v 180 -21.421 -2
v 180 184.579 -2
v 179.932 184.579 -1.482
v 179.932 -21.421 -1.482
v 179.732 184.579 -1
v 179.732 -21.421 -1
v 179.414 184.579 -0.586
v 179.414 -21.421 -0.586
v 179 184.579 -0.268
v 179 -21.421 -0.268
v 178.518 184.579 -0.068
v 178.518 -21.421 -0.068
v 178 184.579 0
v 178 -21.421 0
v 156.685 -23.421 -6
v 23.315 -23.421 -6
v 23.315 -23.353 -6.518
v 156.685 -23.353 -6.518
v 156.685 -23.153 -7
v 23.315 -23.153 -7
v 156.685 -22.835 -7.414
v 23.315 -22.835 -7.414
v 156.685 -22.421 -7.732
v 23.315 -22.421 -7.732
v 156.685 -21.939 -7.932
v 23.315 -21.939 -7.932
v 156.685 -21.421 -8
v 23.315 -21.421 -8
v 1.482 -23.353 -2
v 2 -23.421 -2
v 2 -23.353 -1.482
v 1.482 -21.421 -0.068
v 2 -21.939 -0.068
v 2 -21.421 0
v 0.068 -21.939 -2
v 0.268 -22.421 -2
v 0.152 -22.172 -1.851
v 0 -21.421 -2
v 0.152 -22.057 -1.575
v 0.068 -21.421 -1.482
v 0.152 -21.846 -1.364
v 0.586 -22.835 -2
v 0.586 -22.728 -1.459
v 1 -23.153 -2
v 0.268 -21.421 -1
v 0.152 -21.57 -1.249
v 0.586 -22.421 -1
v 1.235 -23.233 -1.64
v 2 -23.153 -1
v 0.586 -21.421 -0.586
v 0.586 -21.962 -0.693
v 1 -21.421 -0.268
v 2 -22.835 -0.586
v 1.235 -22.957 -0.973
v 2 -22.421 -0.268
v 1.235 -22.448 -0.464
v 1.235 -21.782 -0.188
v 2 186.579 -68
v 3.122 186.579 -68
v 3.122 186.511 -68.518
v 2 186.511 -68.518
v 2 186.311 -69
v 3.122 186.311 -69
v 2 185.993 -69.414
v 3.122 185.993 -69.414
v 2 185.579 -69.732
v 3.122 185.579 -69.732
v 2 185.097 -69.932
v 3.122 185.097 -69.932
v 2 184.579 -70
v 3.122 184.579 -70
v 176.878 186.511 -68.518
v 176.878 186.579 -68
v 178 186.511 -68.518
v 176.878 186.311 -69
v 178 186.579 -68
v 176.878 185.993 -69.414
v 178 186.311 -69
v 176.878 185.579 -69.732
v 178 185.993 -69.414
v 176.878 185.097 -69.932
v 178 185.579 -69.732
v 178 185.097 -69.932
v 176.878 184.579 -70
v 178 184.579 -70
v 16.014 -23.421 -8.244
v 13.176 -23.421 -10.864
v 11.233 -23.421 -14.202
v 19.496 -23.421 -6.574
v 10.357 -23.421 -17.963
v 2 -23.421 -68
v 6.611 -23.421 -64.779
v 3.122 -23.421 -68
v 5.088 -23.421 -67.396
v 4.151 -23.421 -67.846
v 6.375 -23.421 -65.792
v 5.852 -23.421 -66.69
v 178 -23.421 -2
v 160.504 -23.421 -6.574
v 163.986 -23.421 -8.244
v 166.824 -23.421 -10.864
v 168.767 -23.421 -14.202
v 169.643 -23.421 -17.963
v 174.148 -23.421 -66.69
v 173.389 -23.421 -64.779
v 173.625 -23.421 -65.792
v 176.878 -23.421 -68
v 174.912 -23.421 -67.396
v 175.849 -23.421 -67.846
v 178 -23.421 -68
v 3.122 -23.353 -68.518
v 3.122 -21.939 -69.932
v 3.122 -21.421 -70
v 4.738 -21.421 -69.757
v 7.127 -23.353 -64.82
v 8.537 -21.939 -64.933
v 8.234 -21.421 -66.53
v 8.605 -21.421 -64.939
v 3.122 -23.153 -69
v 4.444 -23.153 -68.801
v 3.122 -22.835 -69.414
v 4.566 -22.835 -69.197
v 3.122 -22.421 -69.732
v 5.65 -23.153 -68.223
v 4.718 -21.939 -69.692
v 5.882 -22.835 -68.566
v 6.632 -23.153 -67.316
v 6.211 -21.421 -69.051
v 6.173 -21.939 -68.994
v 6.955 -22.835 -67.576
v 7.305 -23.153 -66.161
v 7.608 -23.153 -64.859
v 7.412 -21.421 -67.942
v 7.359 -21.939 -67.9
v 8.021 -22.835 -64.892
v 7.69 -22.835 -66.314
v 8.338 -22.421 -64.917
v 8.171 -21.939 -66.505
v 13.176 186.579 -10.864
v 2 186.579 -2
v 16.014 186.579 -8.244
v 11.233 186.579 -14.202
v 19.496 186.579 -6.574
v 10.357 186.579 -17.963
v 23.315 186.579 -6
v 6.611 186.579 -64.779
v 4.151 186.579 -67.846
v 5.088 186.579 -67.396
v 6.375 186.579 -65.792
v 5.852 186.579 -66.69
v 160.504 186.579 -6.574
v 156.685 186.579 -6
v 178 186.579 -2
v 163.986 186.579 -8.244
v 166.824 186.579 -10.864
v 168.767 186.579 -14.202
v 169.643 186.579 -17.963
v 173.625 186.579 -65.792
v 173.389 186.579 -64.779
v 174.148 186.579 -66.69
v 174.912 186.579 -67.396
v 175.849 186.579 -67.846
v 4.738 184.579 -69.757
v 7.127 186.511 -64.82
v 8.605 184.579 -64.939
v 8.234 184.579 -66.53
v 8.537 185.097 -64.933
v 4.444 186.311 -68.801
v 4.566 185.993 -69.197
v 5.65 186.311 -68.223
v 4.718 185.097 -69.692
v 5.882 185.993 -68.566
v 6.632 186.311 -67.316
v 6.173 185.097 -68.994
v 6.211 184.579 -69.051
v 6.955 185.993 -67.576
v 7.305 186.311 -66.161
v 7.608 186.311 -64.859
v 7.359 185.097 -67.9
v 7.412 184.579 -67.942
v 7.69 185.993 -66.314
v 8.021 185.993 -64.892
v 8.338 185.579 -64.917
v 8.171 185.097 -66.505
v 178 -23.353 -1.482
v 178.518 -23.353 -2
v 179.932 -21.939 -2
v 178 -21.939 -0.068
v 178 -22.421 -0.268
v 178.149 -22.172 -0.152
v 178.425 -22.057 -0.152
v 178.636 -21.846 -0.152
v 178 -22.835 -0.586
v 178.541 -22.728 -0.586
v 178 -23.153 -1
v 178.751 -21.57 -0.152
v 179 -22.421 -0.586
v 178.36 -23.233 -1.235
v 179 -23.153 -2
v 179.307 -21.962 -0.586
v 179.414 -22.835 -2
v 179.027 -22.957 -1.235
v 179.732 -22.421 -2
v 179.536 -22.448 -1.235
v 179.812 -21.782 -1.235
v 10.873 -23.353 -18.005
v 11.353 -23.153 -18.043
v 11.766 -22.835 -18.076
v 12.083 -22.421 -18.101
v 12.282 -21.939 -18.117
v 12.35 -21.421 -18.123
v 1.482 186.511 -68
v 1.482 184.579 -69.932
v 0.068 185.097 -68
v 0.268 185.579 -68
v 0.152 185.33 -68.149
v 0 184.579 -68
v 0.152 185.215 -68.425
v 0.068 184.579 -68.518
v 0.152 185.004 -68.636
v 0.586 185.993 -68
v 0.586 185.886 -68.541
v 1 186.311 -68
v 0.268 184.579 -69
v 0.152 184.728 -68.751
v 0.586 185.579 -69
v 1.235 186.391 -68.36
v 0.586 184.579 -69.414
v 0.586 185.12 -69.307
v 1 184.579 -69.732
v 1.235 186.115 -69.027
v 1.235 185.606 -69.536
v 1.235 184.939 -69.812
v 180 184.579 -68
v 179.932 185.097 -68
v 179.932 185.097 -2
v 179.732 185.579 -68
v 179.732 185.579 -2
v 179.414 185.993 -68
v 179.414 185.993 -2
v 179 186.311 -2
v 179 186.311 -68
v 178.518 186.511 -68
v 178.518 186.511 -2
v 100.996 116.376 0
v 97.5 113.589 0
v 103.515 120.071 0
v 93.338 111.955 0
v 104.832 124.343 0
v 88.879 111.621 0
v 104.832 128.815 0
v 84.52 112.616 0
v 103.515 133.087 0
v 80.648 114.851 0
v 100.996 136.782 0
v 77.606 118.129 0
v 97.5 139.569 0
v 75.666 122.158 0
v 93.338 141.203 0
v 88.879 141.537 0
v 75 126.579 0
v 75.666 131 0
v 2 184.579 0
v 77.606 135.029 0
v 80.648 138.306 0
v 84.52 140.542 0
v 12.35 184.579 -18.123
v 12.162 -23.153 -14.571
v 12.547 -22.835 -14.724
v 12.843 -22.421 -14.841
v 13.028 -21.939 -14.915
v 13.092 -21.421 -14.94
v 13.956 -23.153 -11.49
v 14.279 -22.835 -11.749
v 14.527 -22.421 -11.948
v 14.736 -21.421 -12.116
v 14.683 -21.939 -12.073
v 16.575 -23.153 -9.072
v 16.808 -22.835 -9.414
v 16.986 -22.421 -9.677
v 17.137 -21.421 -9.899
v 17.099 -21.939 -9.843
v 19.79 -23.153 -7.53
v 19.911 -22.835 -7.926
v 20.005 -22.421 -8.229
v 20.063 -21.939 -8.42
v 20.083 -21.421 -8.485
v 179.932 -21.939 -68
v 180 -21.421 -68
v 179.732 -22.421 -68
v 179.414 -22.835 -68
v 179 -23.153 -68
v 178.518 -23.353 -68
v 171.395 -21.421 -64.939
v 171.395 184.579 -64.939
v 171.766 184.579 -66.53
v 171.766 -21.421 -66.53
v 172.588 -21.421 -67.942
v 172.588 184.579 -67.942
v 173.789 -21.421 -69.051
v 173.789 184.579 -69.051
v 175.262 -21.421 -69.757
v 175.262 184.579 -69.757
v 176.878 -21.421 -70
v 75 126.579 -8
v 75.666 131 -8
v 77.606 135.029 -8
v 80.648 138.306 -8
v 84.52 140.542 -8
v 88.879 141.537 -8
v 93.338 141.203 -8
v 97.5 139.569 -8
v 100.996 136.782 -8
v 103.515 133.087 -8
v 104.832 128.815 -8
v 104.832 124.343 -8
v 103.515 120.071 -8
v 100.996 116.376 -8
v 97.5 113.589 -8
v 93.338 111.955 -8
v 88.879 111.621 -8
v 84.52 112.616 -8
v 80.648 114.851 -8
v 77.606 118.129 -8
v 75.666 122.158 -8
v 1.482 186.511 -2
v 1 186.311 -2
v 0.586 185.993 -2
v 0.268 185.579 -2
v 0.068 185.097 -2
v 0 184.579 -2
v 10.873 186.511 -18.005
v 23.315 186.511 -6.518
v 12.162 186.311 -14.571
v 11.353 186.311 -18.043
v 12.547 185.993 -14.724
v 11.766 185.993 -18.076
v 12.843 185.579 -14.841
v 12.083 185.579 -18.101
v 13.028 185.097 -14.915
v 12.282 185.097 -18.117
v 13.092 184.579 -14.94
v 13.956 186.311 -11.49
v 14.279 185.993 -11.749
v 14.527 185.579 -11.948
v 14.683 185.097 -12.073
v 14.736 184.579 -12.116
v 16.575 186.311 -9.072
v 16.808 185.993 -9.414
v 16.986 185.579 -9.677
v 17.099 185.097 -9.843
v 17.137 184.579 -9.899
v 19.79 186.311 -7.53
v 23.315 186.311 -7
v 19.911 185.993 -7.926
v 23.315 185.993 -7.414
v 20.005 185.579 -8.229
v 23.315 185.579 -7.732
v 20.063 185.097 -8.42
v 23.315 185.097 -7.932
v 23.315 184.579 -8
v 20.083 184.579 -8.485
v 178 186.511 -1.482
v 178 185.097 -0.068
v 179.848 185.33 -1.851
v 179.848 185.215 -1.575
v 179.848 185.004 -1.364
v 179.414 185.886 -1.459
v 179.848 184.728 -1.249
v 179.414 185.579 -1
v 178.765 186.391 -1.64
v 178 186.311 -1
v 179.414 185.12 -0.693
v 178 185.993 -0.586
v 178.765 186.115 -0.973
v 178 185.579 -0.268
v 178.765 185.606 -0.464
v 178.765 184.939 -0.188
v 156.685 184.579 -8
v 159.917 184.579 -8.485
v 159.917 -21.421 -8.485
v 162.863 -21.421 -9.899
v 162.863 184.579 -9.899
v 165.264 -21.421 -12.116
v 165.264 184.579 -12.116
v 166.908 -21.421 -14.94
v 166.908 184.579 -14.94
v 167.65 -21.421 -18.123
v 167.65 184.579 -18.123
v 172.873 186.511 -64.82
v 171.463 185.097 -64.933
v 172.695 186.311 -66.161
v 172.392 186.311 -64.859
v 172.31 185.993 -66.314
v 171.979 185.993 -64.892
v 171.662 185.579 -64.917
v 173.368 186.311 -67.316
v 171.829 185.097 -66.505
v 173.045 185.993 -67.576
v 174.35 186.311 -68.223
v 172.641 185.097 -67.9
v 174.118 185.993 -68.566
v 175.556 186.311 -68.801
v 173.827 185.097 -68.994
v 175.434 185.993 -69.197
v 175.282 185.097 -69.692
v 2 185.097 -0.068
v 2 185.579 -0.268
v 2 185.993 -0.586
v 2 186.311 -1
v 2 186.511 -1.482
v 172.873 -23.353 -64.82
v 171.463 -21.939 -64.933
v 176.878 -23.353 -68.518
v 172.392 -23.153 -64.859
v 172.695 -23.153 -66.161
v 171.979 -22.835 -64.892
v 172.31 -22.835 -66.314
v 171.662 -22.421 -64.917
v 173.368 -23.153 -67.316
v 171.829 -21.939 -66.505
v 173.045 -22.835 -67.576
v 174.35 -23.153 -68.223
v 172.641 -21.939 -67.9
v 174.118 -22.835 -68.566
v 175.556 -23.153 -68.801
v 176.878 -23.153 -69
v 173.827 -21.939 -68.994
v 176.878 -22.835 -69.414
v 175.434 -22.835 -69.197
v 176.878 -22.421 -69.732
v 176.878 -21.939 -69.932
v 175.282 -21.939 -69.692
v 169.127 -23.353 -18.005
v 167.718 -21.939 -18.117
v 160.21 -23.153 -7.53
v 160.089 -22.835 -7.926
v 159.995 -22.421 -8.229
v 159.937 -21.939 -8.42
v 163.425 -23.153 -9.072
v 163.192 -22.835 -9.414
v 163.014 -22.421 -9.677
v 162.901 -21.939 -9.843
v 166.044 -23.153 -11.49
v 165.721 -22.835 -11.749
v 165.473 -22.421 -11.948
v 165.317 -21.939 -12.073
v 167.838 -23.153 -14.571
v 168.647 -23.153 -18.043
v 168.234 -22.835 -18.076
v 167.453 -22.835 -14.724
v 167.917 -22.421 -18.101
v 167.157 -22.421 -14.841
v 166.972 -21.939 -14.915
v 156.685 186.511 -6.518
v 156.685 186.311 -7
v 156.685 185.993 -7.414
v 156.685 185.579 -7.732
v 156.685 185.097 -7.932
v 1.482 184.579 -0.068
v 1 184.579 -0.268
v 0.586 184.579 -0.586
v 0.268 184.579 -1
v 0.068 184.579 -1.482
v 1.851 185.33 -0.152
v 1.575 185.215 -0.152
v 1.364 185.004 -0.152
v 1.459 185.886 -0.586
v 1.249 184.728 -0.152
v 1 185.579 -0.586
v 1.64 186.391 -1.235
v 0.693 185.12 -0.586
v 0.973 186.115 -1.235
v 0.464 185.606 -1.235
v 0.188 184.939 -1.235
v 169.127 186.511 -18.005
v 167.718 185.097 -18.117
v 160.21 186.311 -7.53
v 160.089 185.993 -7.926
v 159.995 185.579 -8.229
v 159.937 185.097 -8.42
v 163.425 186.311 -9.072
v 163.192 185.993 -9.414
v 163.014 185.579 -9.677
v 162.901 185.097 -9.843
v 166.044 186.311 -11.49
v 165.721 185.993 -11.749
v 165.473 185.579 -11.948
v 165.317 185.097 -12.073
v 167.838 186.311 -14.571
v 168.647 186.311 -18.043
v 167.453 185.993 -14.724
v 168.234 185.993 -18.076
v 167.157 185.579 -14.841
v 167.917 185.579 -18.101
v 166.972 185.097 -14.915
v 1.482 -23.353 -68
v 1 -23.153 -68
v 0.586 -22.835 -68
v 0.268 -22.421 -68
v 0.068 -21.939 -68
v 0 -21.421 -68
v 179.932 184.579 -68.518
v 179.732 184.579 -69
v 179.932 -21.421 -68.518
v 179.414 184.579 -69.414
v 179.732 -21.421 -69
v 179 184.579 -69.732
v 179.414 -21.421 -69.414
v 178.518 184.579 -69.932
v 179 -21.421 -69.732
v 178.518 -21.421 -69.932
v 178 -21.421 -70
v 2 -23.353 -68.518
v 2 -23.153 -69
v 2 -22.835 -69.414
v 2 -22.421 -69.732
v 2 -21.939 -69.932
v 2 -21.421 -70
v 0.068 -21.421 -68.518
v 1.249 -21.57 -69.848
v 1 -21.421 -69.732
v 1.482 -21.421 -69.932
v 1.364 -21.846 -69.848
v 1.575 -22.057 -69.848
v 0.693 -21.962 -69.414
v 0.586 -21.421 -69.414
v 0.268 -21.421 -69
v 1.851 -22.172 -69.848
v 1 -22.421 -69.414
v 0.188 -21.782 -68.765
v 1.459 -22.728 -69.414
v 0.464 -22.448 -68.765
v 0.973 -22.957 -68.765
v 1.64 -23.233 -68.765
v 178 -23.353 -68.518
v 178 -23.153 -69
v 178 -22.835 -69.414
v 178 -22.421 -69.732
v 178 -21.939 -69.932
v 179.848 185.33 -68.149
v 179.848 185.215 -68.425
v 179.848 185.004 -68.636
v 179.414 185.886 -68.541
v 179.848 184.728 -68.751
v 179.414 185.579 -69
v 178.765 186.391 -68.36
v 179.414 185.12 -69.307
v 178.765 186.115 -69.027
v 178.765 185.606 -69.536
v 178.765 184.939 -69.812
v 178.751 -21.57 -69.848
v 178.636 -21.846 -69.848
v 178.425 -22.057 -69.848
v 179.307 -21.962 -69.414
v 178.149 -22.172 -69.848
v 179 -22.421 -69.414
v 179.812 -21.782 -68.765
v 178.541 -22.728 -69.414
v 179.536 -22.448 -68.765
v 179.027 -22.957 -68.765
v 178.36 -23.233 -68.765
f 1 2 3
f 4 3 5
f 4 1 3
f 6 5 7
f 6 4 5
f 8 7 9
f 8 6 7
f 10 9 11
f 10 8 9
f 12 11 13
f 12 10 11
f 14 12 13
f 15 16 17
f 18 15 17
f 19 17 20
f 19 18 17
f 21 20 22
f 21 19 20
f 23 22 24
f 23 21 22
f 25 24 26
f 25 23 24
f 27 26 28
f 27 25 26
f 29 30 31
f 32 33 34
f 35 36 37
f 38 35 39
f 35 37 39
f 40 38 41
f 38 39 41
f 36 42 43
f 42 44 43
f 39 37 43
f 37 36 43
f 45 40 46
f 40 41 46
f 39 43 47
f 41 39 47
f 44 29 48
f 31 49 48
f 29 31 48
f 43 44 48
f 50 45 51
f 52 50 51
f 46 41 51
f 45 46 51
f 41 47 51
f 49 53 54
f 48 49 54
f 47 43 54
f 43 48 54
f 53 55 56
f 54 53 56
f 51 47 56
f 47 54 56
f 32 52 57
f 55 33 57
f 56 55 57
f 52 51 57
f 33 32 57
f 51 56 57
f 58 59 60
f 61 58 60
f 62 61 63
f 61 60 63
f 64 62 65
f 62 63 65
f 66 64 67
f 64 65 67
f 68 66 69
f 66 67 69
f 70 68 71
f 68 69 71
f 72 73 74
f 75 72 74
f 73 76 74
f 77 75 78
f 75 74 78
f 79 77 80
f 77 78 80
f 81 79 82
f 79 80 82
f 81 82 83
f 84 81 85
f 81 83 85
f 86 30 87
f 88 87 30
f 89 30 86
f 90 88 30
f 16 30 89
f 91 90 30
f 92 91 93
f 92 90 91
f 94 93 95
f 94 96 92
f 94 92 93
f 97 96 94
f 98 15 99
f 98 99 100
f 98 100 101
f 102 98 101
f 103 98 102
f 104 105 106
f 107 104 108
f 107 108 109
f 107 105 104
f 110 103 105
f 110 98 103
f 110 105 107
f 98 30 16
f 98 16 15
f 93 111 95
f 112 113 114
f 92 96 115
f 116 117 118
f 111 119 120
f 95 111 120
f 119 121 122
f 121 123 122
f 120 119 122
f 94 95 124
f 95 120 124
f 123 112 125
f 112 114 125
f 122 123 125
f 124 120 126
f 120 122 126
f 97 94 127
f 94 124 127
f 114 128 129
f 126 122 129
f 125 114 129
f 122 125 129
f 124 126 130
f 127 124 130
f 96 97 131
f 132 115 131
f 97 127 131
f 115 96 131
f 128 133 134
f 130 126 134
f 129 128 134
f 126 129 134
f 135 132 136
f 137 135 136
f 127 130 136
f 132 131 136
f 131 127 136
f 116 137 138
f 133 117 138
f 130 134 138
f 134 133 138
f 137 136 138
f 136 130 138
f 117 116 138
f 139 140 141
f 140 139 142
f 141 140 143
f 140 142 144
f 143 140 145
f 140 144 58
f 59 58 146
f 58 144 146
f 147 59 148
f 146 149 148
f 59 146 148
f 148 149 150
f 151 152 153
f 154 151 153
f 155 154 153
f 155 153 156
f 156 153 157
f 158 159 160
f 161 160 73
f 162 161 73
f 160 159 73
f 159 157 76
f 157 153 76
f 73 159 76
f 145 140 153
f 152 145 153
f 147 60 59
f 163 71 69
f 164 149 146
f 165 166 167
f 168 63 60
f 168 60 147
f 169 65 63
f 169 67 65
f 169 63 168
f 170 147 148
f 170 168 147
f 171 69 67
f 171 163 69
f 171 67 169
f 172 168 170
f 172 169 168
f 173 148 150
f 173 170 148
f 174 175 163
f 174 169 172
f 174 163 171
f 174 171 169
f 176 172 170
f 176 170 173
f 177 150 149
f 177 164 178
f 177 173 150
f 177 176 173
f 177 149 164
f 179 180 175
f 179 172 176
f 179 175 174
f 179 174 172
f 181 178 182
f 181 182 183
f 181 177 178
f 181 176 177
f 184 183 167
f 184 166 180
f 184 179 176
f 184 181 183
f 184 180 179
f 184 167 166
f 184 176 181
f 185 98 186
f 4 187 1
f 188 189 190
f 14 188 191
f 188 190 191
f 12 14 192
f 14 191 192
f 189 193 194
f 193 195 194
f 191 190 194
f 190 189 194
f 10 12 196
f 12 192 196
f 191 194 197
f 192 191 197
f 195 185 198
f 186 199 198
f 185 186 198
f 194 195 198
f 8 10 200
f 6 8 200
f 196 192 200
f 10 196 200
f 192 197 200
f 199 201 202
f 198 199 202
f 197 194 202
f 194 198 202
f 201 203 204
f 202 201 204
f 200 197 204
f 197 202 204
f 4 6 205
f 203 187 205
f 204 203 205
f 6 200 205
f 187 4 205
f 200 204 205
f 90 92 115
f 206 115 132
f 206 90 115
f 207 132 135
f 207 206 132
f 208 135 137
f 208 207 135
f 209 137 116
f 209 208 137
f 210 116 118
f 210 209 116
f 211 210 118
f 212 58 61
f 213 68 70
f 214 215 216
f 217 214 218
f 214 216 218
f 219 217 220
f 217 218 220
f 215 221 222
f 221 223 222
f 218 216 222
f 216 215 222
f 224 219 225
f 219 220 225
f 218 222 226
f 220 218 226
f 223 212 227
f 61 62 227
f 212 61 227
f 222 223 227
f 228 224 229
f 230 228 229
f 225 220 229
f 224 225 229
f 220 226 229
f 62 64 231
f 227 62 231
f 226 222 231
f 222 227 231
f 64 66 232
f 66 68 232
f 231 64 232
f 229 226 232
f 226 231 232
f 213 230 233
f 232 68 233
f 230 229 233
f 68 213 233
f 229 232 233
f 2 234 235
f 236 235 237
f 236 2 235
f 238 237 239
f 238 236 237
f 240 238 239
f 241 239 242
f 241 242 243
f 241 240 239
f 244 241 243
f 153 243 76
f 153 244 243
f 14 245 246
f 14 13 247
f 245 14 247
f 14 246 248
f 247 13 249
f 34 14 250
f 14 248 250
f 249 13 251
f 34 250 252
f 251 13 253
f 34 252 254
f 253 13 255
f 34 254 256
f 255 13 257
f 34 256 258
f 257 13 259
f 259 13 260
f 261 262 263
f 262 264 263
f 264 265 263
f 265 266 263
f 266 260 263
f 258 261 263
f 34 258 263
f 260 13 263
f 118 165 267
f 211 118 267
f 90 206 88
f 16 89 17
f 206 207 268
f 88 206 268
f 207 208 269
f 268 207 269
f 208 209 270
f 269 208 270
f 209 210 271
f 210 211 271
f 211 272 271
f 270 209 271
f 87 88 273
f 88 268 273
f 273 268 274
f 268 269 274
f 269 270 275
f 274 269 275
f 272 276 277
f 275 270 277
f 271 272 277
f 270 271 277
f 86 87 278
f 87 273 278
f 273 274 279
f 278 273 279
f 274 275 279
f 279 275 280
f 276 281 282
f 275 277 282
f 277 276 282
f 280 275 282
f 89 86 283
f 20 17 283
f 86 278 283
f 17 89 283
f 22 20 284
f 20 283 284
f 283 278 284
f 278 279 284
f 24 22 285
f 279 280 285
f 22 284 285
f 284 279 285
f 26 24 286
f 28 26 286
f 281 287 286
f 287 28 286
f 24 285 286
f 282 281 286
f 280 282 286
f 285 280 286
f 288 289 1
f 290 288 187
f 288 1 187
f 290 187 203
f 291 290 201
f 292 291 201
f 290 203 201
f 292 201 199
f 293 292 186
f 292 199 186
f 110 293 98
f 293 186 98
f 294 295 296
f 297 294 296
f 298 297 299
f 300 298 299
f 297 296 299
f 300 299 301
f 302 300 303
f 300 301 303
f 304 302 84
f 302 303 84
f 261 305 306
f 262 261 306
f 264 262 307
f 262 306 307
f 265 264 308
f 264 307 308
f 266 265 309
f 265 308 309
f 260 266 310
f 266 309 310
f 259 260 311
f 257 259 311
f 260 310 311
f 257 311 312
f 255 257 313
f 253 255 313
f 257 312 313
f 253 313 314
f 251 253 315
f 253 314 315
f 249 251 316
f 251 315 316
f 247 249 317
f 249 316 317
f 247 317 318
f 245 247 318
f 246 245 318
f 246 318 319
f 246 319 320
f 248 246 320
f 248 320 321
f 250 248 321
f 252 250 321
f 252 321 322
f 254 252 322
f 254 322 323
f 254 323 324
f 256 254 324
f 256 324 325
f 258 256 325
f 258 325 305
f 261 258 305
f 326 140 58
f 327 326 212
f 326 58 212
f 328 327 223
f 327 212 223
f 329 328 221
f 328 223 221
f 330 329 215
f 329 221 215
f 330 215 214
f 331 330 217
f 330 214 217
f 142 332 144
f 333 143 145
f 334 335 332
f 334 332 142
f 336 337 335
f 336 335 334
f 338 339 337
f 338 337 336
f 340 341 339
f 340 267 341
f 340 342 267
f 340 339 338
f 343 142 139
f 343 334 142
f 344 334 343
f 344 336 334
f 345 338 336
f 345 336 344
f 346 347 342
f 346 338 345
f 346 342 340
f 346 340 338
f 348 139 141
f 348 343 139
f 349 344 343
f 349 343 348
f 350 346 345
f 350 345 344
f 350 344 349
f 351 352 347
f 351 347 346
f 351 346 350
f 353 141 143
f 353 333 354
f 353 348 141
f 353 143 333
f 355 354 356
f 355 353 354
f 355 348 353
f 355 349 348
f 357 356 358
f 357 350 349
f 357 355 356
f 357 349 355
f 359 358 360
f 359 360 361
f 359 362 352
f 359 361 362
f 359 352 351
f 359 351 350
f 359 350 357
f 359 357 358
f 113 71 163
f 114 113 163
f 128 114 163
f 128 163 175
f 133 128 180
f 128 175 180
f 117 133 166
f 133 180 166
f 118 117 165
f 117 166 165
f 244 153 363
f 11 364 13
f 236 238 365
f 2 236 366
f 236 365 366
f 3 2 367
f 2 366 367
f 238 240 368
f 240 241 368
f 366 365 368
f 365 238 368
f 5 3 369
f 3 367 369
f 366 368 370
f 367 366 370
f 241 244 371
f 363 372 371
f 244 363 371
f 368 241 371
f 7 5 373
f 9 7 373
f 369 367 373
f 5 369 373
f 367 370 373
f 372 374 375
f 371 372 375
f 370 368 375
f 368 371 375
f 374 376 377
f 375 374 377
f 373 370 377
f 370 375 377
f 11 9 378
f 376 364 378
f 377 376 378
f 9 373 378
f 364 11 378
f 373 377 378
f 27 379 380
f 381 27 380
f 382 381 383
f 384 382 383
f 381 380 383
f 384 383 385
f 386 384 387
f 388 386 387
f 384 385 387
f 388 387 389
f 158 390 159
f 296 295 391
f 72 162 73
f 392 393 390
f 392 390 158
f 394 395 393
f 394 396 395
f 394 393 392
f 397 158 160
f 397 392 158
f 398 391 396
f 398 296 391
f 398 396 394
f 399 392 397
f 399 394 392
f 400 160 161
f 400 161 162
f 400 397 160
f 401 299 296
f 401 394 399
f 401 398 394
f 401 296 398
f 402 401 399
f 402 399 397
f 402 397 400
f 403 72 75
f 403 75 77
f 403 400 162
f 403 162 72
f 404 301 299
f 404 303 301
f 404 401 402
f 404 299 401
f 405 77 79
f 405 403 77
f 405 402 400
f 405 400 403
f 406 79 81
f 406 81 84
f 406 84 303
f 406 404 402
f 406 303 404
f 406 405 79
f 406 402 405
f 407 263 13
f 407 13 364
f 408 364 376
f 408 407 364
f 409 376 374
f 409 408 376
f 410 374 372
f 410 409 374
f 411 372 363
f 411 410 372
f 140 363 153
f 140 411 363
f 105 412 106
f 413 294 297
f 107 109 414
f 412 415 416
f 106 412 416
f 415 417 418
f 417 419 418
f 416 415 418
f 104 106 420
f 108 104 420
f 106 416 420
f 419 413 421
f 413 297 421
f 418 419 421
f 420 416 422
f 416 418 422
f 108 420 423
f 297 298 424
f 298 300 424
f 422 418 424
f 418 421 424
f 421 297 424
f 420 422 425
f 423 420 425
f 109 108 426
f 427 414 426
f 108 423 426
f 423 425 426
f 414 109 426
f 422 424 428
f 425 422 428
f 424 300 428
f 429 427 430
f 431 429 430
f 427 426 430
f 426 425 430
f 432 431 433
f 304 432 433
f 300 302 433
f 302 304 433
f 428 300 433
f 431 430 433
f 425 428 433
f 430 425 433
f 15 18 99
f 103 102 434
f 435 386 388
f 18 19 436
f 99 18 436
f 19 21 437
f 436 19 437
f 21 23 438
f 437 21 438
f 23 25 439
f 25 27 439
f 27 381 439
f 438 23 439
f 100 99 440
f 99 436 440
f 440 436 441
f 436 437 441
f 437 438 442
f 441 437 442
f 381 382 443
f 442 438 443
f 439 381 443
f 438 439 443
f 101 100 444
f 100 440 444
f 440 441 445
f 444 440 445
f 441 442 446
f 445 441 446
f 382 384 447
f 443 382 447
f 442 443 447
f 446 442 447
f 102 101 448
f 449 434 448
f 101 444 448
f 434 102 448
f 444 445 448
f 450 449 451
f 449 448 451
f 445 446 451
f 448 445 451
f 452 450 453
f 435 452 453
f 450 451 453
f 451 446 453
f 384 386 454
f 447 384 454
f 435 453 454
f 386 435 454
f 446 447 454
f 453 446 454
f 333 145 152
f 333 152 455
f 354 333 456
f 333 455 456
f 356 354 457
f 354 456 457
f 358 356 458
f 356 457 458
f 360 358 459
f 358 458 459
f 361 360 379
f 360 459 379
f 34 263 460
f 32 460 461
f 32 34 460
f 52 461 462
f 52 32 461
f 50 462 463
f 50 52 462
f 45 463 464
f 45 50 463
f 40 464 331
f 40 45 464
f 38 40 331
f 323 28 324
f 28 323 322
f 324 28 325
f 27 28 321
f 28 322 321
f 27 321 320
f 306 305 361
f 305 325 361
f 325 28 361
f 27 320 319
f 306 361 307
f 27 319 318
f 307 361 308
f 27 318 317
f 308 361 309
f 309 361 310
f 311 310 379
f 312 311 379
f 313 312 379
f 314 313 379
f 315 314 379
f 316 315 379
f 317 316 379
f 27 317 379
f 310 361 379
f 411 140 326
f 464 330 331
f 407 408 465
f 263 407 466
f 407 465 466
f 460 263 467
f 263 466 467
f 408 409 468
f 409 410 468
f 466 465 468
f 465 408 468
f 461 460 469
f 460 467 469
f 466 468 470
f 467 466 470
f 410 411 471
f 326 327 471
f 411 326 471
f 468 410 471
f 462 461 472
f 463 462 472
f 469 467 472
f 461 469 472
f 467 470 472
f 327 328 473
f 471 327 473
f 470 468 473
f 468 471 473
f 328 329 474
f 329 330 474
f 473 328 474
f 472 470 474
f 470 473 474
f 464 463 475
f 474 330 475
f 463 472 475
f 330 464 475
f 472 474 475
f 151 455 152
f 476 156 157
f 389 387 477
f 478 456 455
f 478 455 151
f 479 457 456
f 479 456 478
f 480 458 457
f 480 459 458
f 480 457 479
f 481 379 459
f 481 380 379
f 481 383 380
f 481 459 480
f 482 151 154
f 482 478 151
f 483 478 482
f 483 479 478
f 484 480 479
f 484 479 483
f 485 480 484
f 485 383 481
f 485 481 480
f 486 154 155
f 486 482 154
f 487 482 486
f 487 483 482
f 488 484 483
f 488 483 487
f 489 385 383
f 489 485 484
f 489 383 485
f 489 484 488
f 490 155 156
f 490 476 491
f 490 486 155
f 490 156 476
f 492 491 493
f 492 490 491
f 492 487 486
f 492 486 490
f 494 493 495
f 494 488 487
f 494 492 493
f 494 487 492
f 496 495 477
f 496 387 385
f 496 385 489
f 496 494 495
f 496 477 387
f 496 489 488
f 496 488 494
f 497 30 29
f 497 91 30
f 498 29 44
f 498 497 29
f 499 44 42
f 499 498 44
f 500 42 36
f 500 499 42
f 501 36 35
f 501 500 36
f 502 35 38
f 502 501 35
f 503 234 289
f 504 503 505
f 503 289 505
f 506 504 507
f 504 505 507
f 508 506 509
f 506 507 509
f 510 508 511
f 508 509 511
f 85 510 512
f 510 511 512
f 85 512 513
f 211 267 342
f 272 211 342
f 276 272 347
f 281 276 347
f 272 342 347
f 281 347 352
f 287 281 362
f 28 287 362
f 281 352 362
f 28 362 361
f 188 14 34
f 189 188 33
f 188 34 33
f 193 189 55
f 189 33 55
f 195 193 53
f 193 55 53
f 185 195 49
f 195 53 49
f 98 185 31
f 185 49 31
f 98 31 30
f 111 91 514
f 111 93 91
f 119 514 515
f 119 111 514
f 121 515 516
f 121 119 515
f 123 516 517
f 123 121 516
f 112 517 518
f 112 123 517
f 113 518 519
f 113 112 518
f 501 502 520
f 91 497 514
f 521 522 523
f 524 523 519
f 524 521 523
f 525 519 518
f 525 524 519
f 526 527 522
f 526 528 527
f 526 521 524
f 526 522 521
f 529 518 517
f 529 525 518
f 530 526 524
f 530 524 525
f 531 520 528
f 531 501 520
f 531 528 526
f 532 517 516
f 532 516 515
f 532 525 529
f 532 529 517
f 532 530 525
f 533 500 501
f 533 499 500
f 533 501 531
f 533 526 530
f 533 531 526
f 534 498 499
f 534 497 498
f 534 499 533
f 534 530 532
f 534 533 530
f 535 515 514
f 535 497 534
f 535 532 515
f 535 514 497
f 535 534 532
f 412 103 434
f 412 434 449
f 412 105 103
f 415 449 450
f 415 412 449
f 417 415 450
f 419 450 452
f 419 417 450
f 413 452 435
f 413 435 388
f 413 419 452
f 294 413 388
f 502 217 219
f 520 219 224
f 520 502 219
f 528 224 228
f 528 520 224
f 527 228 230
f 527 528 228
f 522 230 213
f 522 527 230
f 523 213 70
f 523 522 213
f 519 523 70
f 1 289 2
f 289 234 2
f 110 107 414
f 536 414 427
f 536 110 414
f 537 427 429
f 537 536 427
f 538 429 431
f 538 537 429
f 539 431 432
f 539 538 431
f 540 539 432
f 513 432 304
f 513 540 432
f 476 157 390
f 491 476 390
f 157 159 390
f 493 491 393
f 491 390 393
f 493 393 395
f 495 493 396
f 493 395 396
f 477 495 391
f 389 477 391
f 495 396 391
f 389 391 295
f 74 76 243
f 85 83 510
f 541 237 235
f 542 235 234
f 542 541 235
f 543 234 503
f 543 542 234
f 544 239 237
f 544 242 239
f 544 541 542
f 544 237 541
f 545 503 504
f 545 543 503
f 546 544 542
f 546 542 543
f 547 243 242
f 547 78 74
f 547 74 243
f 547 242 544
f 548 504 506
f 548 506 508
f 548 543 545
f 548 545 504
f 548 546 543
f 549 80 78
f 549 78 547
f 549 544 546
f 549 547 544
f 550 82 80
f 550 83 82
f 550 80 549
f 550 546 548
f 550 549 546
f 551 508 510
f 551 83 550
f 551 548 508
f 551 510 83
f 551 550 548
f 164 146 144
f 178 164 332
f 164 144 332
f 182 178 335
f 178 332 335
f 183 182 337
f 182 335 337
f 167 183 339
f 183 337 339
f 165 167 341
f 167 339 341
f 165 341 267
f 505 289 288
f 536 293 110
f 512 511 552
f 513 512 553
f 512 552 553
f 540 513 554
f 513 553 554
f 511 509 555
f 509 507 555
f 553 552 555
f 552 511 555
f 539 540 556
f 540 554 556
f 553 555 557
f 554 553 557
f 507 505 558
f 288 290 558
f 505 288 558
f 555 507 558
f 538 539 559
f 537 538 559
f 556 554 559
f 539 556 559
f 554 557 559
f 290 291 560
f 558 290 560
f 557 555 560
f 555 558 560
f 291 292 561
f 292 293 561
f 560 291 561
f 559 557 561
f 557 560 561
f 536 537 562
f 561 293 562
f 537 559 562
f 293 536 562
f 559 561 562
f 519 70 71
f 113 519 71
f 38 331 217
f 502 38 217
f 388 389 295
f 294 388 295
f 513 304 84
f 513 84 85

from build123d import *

# Parameters (mm, degrees)
UPN_UPN180_1_DEPTH = 210
SKETCH17_R         = 15
CUT_EXTRUDE1_DEPTH = 10
FILLET1_R          = 2


with BuildPart() as part:
    # Sketch110 → Upn UPN180(1) (new body)
    with BuildSketch(Plane(origin=(0, 186.578947368, 0), x_dir=(0, 0, -1), z_dir=(0, -1, 0))):
        with BuildLine():
            Line((70, 180), (0, 180))
            Line((0, 180), (0, 0))
            Line((0, 0), (70, 0))
            Line((70, 0), (70, 3.122386663))
            ThreePointArc((70, 3.122386663), (68.541183887, 6.853181859), (64.938606257, 8.604870092))
            Line((64.938606257, 8.604870092), (18.122787486, 12.350200343))
            ThreePointArc((18.122787486, 12.350200343), (10.917632226, 15.85357681), (8, 23.315167202))
            Line((8, 23.315167202), (8, 156.684832798))
            ThreePointArc((8, 156.684832798), (10.917632226, 164.14642319), (18.122787486, 167.649799657))
            Line((18.122787486, 167.649799657), (64.938606257, 171.395129908))
            ThreePointArc((64.938606257, 171.395129908), (68.541183887, 173.146818141), (70, 176.877613337))
            Line((70, 176.877613337), (70, 180))
        make_face()
    extrude(amount=UPN_UPN180_1_DEPTH)

    # Sketch17 → Cut-Extrude1 (cut)
    with BuildSketch(Plane(origin=(0, 0, -8), x_dir=(-1, 0, 0), z_dir=(0, 0, -1))):
        with Locations((-90, 126.578947368)):
            Circle(SKETCH17_R)
    extrude(amount=-CUT_EXTRUDE1_DEPTH, mode=Mode.SUBTRACT)

    # Fillet1
    fillet1_edges = [part.edges().sort_by_distance(p)[0] for p in [
        (169.522464782, 186.578947368, -41.530696872),
        (164.14642319, 186.578947368, -10.917632226),
        (180, -23.421052632, -35),
        (90, 186.578947368, -8),
        (15.85357681, 186.578947368, -10.917632226),
        (10.477535218, 186.578947368, -41.530696872),
        (6.853181859, 186.578947368, -68.541183887),
        (1.561193332, 186.578947368, -70),
        (0, 186.578947368, -35),
        (90, 186.578947368, 0),
        (180, 186.578947368, -35),
        (178.438806668, 186.578947368, -70),
        (173.146818141, 186.578947368, -68.541183887),
        (90, -23.421052632, 0),
        (0, -23.421052632, -35),
        (0, 81.578947368, -70),
        (0, 81.578947368, 0),
        (180, 81.578947368, 0),
        (180, 81.578947368, -70),
        (1.561193332, -23.421052632, -70),
        (6.853181859, -23.421052632, -68.541183887),
        (10.477535218, -23.421052632, -41.530696872),
        (15.85357681, -23.421052632, -10.917632226),
        (90, -23.421052632, -8),
        (164.14642319, -23.421052632, -10.917632226),
        (169.522464782, -23.421052632, -41.530696872),
        (173.146818141, -23.421052632, -68.541183887),
        (178.438806668, -23.421052632, -70),
    ]]
    fillet(fillet1_edges, radius=FILLET1_R)


solid = part.part
